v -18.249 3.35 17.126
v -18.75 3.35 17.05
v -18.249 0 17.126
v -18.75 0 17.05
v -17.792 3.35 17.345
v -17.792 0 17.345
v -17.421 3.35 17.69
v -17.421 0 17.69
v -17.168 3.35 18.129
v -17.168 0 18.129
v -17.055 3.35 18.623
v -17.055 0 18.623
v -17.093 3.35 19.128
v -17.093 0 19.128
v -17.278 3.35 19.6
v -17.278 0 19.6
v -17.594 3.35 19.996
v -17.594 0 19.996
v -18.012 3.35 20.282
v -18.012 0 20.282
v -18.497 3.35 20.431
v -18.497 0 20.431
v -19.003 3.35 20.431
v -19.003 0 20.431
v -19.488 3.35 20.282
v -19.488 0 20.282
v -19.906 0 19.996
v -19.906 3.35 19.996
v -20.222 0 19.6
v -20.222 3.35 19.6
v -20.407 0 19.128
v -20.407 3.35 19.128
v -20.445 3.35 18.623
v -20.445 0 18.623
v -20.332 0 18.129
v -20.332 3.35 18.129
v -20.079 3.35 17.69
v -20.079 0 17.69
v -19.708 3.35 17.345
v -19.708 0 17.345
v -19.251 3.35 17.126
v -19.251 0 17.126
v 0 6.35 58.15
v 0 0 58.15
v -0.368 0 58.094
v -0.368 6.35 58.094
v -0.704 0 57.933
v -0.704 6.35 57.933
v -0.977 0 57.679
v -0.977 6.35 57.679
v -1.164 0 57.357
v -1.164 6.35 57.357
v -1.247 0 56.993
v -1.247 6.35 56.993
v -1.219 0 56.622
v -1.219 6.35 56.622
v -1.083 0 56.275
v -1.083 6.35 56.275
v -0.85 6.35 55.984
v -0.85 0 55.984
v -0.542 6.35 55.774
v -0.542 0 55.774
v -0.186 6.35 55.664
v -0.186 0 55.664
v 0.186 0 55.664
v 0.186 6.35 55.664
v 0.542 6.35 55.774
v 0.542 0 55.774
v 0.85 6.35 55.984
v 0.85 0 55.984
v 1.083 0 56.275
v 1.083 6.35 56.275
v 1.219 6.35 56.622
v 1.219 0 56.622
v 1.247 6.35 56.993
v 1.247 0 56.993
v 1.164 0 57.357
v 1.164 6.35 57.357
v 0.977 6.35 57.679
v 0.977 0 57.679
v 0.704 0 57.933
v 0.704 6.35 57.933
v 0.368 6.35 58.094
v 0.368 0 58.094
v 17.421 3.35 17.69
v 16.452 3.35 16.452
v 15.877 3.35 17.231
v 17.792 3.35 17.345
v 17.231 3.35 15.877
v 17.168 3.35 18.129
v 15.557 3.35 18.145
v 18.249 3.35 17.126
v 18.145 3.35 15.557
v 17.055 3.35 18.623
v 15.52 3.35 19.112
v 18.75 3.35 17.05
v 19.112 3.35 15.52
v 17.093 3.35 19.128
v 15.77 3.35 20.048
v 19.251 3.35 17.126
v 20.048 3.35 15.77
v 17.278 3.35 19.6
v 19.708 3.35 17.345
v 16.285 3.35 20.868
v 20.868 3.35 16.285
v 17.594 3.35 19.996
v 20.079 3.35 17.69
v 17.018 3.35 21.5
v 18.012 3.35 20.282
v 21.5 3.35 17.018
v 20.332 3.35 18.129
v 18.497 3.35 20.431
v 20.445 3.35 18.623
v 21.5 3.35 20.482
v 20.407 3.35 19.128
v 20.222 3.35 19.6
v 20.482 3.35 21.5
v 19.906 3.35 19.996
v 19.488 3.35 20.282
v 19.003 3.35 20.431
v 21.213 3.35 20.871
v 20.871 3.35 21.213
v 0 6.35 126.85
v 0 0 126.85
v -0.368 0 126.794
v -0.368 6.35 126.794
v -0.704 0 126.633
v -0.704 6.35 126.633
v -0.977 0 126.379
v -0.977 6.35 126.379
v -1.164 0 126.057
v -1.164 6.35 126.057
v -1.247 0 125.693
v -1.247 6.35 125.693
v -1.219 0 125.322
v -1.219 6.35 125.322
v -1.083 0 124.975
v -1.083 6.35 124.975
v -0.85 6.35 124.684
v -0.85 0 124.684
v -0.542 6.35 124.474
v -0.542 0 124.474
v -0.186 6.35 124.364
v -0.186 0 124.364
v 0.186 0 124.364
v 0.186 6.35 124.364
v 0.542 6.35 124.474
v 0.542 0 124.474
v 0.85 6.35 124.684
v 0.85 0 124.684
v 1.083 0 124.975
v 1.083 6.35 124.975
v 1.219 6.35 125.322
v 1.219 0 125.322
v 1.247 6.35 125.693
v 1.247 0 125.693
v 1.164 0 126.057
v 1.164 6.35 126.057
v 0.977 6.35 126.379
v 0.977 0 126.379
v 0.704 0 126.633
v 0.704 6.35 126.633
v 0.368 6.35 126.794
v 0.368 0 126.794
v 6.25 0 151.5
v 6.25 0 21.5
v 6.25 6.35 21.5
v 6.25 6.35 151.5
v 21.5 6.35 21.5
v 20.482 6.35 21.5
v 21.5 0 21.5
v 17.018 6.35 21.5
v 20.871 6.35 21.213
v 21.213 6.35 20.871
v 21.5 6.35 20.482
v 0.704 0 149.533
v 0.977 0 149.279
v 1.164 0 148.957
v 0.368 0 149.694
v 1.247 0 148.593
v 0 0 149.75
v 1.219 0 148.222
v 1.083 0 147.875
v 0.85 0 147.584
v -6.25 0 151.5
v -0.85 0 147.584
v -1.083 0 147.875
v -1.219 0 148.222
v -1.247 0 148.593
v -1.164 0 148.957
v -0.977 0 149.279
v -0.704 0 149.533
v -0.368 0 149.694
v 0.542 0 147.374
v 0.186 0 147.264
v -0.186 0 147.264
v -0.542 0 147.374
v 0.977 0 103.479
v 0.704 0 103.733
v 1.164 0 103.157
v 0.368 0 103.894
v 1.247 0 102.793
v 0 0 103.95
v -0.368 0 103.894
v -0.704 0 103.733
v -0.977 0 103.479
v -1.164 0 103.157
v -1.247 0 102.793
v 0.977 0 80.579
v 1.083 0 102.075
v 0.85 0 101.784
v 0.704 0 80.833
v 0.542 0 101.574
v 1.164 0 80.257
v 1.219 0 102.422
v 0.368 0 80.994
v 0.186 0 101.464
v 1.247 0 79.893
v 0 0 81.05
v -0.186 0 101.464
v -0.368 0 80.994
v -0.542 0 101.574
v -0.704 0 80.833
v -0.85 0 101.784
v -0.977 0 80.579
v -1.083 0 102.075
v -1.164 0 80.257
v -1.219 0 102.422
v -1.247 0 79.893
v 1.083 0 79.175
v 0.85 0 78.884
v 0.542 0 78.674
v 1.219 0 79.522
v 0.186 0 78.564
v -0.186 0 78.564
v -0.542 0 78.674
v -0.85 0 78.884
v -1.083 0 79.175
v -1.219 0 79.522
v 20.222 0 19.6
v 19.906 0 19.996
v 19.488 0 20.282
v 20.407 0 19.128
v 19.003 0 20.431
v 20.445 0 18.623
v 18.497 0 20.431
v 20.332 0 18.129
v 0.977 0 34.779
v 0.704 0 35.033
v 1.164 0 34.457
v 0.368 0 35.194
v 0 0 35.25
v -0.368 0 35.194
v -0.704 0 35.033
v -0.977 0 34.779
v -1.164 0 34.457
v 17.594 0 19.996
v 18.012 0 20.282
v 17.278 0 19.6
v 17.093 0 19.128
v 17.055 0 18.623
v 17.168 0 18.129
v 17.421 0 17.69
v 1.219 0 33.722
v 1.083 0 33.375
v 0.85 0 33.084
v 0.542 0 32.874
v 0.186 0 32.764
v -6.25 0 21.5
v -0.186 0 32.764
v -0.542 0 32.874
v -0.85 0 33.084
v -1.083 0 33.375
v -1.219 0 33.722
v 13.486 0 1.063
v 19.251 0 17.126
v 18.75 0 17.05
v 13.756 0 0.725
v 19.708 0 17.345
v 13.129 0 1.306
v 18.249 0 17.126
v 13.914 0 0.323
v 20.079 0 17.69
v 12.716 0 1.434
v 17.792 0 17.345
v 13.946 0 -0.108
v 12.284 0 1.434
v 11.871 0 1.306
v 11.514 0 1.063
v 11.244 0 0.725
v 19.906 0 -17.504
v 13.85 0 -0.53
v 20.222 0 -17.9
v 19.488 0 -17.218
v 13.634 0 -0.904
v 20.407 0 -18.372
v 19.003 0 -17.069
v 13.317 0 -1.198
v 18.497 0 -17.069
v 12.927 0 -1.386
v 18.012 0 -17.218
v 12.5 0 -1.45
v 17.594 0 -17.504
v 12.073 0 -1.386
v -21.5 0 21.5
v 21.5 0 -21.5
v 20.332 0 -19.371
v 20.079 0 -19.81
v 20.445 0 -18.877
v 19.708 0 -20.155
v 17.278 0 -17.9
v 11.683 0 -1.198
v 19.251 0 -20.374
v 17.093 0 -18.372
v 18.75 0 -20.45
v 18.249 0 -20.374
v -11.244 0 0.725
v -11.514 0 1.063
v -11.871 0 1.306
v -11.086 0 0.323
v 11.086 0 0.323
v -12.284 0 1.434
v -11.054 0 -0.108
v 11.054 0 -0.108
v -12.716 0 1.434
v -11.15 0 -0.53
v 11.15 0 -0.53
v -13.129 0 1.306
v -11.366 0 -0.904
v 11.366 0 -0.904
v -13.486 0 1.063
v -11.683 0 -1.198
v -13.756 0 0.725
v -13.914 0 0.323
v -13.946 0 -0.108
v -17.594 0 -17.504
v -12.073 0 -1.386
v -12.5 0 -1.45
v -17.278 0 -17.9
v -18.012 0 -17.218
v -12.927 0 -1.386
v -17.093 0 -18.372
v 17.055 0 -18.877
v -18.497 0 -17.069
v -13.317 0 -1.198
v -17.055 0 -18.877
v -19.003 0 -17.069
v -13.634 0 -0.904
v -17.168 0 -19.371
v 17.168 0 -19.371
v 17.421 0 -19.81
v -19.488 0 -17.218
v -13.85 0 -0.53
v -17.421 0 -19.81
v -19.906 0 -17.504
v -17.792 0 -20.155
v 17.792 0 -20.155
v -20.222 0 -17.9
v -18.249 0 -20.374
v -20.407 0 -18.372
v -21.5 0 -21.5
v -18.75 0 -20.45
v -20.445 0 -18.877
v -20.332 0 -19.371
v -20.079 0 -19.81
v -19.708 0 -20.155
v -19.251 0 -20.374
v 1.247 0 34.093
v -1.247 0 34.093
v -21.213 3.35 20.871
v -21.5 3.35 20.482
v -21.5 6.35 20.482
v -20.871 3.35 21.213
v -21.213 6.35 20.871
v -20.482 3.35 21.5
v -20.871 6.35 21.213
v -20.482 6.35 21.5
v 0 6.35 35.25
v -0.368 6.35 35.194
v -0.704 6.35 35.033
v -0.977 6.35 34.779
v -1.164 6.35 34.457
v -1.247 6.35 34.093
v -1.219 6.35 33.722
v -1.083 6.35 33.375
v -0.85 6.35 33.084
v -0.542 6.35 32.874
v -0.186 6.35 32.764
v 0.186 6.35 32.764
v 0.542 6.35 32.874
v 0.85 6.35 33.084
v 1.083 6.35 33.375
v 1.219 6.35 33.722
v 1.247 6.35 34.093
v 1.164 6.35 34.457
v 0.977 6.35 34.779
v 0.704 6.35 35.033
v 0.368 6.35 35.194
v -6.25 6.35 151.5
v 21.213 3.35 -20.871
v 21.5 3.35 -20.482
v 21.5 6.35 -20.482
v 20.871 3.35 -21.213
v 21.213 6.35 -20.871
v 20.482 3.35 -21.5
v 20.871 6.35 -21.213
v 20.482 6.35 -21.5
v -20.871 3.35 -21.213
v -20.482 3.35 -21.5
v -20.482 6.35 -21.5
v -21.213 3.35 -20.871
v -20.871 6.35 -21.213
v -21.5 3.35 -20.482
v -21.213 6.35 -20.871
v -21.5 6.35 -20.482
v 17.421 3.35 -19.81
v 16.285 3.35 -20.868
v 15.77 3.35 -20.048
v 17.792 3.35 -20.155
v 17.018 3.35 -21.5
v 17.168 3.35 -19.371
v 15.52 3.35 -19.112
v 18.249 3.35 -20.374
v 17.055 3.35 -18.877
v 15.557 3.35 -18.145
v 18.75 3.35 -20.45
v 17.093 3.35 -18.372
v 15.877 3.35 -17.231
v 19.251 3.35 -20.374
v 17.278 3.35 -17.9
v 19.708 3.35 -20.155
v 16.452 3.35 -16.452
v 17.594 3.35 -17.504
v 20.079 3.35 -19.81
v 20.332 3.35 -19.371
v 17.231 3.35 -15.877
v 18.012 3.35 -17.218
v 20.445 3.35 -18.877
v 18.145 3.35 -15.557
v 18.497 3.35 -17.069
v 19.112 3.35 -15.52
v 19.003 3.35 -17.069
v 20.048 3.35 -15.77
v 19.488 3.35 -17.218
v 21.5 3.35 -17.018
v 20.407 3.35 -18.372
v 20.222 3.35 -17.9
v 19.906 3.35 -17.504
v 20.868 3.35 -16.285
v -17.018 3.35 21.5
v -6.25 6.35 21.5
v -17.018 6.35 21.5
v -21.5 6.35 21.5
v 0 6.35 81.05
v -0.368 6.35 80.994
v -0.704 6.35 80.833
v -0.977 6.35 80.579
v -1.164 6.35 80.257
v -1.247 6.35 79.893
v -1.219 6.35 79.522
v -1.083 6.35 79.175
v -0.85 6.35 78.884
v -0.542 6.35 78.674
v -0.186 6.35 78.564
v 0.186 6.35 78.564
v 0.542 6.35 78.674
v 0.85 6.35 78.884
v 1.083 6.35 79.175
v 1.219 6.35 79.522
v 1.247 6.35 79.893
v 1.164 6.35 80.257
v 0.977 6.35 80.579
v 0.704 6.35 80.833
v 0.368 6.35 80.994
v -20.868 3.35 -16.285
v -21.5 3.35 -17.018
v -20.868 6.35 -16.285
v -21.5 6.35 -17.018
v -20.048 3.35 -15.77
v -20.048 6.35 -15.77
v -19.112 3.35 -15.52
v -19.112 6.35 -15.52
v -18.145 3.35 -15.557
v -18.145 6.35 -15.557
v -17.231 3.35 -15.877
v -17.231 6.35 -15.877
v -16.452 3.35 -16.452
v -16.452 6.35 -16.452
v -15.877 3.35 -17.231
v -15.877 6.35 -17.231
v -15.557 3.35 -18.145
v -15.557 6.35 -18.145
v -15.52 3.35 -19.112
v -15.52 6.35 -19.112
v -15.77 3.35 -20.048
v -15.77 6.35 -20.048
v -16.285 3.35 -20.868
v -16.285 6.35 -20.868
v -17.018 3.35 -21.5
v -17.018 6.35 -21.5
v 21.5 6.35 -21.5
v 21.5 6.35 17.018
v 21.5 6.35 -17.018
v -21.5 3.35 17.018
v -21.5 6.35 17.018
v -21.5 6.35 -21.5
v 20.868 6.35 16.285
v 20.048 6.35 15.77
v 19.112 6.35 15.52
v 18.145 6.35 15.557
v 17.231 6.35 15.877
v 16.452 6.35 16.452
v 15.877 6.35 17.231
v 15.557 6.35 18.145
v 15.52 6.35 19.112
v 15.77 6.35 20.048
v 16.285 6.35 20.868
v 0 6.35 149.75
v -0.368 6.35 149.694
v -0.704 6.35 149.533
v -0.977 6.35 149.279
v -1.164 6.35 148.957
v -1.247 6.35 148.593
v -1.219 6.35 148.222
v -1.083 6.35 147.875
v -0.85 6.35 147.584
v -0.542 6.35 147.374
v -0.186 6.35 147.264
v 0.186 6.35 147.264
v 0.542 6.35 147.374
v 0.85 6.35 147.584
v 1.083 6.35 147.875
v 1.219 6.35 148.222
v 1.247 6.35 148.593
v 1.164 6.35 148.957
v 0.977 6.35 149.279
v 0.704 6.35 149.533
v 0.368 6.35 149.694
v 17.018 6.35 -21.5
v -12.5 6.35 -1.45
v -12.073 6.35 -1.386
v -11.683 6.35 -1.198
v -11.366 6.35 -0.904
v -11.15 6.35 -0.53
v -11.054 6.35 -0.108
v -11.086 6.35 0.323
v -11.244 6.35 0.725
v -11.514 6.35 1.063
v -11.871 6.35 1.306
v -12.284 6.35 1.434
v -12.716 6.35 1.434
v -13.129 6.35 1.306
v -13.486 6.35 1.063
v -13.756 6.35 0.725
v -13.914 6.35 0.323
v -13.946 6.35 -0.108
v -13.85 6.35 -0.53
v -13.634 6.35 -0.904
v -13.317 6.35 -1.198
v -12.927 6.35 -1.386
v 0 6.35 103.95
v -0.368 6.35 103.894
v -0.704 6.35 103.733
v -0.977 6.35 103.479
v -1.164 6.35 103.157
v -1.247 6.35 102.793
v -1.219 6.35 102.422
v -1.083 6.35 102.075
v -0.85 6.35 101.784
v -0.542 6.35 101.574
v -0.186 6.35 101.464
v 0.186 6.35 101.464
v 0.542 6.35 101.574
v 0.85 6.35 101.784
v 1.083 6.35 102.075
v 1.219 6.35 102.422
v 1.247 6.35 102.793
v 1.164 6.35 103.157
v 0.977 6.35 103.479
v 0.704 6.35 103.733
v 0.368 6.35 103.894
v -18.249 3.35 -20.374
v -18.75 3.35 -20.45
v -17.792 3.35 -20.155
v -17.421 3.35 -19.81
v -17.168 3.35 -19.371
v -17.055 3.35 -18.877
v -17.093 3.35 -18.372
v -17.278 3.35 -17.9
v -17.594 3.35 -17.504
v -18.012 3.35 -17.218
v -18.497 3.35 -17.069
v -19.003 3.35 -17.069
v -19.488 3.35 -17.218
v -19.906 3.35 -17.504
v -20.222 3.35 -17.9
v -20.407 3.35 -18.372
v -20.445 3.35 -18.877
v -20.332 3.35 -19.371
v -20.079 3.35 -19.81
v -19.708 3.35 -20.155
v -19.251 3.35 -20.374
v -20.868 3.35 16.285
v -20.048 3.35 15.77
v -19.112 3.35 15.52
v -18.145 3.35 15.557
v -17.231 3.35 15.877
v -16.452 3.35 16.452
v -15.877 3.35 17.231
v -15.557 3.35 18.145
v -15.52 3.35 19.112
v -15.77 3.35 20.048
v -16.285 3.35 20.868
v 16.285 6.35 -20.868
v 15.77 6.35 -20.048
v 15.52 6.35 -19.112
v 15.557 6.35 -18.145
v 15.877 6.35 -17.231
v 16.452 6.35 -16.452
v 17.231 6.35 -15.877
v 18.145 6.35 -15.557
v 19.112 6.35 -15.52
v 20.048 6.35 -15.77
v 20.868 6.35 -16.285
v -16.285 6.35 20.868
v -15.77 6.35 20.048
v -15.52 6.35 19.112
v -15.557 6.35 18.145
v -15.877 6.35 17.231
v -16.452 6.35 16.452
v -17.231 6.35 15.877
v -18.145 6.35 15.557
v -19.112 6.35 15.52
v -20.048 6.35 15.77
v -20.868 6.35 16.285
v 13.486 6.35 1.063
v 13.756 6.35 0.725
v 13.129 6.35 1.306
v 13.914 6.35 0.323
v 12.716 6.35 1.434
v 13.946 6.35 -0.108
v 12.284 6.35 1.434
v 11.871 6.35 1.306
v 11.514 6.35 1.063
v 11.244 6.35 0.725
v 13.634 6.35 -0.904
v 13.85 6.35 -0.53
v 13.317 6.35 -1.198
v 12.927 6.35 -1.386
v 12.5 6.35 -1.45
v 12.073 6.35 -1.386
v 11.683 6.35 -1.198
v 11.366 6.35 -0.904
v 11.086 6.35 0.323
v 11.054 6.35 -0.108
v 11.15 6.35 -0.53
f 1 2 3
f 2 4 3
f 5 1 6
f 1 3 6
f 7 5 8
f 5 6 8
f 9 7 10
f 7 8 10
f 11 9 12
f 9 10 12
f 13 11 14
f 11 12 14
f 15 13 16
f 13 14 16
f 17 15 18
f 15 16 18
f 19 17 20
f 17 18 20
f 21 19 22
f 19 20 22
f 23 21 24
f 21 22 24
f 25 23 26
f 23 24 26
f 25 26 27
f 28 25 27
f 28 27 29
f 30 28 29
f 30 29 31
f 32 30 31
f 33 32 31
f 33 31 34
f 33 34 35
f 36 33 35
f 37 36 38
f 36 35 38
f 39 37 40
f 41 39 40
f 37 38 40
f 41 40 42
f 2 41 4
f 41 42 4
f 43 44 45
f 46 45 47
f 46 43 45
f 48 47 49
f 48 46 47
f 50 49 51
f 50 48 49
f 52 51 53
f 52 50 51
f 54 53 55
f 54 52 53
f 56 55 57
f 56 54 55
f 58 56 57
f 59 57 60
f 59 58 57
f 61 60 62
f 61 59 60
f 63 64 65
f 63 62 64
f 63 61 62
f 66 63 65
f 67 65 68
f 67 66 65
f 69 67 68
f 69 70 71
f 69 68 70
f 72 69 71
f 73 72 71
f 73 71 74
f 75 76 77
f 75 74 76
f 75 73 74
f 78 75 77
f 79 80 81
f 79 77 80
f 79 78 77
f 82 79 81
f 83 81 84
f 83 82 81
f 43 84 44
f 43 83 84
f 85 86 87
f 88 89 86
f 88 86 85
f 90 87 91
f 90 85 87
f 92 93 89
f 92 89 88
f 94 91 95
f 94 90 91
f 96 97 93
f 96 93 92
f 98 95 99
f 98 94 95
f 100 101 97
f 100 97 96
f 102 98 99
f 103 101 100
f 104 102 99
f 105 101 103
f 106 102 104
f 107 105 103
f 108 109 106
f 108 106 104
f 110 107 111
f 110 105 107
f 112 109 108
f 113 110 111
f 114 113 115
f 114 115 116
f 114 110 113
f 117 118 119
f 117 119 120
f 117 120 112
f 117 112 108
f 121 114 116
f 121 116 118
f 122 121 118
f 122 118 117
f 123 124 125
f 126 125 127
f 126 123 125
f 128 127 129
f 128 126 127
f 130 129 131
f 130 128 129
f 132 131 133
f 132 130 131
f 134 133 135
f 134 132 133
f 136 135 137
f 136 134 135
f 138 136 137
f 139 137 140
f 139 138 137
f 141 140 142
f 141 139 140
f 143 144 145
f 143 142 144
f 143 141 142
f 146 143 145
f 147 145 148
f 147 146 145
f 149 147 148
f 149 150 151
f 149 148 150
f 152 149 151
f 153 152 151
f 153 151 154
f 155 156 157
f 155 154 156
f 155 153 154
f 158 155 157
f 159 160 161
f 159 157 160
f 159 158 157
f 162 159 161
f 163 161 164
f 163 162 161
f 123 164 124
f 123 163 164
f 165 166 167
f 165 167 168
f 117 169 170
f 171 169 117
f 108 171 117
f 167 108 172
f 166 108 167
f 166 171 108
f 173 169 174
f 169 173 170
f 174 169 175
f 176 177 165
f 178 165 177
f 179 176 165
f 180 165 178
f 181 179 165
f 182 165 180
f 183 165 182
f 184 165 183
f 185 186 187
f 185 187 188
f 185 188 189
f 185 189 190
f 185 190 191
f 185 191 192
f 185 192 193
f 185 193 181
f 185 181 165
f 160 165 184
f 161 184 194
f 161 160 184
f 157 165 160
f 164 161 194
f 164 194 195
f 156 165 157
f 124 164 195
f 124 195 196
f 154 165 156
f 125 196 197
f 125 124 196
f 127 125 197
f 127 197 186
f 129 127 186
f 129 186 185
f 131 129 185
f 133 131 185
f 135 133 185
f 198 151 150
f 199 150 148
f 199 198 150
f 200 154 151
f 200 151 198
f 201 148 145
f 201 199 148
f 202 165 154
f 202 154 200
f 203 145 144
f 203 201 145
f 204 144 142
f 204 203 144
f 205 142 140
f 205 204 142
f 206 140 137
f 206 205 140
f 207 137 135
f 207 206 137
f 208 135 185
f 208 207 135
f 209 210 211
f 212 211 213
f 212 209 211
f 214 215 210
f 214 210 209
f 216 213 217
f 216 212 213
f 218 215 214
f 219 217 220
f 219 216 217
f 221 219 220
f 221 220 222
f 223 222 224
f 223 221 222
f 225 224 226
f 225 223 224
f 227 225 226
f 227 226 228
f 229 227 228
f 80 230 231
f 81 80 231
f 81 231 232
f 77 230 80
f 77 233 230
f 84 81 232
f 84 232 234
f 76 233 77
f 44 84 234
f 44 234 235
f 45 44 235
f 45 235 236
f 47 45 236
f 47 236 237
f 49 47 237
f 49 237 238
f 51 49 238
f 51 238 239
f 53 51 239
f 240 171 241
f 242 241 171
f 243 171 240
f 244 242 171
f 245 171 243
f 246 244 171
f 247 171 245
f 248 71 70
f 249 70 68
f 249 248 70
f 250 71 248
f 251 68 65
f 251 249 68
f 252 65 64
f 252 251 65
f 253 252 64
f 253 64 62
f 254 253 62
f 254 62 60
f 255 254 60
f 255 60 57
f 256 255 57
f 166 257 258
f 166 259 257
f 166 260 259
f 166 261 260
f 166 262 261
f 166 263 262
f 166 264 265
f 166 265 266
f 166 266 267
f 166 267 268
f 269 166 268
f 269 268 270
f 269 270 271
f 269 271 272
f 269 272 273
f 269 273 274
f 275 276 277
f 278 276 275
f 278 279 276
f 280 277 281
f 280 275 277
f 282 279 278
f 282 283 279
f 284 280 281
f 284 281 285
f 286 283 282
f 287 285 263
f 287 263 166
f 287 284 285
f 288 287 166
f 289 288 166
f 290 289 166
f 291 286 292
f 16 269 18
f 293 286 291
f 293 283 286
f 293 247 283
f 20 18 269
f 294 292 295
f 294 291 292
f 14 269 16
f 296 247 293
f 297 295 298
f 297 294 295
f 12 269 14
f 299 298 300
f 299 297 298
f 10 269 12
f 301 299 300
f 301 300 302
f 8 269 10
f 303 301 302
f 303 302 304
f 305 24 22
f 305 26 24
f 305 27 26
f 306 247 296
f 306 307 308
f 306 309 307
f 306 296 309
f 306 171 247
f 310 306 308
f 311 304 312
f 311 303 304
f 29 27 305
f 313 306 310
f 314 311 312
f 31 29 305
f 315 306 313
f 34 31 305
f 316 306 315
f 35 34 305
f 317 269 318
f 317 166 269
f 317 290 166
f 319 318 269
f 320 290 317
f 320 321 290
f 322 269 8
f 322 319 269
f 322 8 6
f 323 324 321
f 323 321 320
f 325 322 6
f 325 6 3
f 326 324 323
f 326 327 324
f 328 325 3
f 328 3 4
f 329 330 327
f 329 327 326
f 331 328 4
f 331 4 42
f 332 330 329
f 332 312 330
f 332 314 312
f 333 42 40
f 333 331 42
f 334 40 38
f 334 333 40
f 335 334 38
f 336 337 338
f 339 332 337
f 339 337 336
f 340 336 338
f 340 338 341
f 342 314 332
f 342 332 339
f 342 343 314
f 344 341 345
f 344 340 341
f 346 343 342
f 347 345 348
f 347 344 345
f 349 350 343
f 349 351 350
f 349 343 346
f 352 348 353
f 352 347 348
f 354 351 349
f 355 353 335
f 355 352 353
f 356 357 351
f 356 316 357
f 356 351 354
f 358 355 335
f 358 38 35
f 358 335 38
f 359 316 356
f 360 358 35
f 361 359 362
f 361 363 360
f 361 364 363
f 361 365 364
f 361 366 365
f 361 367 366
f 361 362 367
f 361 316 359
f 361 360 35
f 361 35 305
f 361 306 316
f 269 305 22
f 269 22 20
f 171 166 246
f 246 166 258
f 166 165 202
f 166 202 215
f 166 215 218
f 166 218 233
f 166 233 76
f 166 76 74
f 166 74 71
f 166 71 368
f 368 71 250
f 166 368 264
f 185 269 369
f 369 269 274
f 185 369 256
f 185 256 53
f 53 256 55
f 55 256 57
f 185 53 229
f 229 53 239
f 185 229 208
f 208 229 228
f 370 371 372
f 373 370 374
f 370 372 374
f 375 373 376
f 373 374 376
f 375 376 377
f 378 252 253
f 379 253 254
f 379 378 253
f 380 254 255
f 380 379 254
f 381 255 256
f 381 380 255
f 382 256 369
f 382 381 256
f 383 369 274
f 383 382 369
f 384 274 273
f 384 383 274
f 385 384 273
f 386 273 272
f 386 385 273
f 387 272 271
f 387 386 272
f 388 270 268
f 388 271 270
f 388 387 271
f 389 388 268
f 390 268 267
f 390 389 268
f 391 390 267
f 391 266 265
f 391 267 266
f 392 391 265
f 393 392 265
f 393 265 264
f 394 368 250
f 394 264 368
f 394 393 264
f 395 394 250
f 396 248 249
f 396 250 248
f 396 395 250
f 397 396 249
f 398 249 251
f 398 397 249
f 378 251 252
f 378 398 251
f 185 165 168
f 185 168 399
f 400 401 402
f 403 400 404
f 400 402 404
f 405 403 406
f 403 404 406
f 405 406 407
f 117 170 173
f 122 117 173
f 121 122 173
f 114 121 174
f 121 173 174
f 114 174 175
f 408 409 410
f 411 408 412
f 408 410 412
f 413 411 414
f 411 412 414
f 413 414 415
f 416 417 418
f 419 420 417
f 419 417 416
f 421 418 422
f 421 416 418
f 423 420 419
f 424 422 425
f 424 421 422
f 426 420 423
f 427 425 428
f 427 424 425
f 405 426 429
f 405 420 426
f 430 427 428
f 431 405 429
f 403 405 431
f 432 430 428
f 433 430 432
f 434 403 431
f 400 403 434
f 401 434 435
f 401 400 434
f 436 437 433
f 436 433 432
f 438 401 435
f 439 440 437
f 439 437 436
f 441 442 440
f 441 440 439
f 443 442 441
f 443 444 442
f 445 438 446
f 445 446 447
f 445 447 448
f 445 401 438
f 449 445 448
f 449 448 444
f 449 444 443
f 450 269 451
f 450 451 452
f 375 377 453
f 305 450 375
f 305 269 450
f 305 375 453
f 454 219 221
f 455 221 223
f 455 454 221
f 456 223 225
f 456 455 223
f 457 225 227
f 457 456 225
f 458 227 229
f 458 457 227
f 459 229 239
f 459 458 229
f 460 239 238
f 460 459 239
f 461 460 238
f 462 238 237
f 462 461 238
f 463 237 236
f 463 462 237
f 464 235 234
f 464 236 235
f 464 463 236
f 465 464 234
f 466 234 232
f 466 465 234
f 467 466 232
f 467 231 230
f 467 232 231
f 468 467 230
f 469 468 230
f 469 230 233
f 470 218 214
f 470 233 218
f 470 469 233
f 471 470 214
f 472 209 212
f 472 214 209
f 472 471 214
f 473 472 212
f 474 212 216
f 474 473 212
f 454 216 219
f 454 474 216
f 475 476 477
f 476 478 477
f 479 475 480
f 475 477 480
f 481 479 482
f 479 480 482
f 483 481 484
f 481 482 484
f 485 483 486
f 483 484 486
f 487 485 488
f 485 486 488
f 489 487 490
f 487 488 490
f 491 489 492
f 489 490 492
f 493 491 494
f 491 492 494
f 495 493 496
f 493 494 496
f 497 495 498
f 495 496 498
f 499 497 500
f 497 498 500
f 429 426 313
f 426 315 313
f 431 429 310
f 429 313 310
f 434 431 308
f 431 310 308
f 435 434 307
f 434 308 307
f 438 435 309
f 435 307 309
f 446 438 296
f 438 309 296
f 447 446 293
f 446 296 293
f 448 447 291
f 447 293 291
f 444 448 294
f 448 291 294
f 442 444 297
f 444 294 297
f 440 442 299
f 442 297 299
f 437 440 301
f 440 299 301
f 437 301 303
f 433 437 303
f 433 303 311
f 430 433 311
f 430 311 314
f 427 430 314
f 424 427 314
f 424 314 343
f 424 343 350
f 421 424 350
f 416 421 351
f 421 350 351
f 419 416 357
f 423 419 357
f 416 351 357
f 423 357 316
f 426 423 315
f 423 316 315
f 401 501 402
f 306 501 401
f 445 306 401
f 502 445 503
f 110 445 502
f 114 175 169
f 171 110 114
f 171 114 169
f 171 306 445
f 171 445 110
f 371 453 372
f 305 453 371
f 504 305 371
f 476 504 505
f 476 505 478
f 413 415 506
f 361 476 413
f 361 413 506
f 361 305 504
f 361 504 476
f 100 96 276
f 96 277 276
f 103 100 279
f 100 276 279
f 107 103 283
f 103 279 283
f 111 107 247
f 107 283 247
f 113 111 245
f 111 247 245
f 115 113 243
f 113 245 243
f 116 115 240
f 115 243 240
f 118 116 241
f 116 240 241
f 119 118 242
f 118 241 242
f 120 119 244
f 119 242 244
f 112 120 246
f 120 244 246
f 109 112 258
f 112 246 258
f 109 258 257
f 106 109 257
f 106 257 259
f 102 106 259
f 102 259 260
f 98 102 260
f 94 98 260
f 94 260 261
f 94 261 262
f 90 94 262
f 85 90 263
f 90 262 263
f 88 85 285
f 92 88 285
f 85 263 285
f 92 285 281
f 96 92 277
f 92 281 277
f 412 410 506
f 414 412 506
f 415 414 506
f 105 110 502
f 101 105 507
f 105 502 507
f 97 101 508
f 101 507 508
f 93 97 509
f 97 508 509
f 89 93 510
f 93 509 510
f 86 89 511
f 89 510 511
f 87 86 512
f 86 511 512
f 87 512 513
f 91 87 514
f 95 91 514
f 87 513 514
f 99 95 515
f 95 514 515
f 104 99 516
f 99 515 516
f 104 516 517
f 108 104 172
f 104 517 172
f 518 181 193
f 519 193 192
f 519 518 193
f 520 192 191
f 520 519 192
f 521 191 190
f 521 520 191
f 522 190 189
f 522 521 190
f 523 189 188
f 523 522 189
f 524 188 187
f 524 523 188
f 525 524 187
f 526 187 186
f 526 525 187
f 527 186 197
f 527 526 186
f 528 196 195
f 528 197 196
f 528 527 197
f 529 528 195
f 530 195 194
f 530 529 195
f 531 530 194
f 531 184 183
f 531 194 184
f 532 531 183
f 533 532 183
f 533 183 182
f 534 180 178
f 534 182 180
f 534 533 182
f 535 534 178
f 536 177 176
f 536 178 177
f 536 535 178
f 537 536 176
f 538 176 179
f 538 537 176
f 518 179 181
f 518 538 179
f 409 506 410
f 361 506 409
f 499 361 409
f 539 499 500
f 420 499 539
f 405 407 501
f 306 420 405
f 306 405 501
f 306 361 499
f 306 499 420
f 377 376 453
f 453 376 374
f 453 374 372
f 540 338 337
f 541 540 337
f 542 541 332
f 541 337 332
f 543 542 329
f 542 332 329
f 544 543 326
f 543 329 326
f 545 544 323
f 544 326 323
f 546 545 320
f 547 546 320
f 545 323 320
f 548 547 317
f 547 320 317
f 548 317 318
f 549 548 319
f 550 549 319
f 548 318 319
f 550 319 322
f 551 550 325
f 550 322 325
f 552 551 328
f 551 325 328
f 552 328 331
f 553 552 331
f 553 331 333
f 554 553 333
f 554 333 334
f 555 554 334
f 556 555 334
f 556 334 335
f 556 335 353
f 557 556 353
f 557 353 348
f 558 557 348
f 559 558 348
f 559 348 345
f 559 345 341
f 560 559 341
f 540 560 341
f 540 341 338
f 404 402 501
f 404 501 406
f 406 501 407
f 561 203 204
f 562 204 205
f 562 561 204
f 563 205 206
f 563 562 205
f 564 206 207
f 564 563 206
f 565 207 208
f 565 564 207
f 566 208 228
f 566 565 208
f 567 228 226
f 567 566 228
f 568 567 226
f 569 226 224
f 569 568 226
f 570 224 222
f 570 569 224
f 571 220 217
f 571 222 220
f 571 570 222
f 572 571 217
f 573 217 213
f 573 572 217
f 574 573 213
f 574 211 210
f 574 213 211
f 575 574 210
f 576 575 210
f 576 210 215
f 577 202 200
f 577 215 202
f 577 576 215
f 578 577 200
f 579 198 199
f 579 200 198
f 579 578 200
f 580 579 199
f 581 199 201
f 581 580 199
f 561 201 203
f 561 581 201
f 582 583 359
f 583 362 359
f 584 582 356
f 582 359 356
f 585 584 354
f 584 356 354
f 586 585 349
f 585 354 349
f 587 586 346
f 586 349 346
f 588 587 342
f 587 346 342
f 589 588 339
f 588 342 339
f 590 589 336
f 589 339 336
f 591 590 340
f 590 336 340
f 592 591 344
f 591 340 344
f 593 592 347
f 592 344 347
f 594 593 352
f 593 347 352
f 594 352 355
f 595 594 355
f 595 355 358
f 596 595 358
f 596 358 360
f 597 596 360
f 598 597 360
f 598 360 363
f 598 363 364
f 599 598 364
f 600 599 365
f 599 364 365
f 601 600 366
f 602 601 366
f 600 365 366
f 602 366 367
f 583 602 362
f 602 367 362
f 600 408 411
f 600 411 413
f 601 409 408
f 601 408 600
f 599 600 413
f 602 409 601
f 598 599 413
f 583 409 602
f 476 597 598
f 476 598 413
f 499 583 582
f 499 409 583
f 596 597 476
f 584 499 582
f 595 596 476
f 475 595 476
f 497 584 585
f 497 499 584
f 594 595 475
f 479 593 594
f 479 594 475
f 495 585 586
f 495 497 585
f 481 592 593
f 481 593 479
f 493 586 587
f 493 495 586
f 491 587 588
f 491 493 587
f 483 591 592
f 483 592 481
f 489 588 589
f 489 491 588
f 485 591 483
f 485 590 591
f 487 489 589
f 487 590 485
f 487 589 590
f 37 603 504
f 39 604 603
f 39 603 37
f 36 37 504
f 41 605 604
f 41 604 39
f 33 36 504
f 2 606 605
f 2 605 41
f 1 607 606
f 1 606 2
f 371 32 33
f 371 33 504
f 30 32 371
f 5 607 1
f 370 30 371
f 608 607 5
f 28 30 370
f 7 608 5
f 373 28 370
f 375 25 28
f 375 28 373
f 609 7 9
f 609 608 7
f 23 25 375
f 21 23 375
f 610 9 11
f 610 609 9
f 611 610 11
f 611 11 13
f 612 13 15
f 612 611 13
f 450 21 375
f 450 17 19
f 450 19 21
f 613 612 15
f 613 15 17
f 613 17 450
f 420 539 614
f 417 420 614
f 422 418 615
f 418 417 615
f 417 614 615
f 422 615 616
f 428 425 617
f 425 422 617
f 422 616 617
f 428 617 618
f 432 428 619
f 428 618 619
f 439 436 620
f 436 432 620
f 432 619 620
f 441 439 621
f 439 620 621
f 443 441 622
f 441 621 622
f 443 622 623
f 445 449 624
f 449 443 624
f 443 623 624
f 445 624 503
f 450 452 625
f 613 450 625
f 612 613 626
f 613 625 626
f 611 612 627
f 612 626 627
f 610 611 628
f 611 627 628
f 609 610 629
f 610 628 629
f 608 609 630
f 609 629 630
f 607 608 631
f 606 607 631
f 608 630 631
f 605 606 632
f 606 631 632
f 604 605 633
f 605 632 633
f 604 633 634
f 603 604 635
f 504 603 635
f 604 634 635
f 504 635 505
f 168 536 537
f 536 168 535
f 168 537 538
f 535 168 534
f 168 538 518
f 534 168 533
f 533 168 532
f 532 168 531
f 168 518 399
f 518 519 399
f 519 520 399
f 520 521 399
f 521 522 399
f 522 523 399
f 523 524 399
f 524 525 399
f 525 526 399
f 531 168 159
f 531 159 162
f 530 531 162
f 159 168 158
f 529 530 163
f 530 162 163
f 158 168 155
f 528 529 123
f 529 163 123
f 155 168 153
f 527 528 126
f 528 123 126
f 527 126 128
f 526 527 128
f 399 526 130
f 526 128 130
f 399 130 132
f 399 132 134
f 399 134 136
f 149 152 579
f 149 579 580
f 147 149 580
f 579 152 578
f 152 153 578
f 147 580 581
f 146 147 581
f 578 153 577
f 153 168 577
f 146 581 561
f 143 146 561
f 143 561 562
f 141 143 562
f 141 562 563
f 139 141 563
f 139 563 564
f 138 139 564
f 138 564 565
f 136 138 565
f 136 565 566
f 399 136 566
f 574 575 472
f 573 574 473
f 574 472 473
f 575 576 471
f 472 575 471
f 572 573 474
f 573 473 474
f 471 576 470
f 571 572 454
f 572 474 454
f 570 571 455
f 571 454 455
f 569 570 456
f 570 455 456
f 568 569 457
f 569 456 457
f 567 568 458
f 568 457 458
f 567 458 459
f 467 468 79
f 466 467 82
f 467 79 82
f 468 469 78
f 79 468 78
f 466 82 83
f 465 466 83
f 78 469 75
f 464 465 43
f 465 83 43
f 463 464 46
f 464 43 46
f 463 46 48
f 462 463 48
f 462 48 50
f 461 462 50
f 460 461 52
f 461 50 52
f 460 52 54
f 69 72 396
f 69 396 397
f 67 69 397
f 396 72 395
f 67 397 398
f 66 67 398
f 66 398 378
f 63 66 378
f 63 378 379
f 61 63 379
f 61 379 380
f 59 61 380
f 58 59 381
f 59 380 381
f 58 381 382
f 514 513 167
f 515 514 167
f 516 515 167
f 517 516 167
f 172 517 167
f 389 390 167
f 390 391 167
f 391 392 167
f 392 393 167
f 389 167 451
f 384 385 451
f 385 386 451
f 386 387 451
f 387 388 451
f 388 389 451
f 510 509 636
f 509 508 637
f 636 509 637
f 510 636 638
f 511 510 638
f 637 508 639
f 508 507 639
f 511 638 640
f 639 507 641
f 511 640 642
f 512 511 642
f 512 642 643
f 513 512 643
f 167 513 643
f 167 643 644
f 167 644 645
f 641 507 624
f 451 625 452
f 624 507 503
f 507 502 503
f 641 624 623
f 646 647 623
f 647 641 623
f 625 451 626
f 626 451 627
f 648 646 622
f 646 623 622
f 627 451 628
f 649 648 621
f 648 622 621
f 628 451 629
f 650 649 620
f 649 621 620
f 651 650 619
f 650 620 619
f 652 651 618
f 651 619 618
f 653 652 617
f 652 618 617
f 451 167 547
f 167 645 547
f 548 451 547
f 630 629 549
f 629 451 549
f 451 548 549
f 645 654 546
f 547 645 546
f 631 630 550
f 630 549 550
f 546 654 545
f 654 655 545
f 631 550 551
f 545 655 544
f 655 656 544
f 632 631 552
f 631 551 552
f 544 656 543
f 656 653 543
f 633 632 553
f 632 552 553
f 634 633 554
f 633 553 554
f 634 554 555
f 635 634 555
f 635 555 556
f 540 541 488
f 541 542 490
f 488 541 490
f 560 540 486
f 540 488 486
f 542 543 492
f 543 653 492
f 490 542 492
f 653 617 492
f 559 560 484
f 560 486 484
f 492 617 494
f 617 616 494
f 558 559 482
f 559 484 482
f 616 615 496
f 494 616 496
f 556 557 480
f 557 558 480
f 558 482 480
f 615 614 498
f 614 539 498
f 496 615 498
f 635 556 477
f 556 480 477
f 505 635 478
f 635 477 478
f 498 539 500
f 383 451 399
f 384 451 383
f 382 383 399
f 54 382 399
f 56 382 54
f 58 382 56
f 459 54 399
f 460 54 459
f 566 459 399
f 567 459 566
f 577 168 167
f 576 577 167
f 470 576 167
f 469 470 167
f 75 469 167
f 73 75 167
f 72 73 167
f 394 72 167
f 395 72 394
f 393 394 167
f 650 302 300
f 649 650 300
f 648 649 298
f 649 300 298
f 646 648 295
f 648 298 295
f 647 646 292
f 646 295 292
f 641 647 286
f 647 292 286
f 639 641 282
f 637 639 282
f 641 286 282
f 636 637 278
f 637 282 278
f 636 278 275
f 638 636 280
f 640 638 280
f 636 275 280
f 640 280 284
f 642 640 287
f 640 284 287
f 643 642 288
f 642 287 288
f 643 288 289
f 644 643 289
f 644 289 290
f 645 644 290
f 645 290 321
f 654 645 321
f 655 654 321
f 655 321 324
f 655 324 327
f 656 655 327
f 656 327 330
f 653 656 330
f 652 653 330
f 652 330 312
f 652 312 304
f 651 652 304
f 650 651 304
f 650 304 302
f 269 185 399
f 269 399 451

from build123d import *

# Parameters (mm, degrees)
EXTRUDE1_DEPTH                 = 6.35
LPATTERN1_COUNT                = 6
LPATTERN1_PITCH                = 22.9
CBORE_FOR_M3_SHCS1_D           = 3.4
CBORE_FOR_M3_SHCS1_CBORE_D     = 6.5
CBORE_FOR_M3_SHCS1_CBORE_DEPTH = 3
LPATTERN2_COUNT                = 2
LPATTERN2_PITCH                = 37.5
LPATTERN2_COUNT_DIR2           = 2
LPATTERN2_PITCH_DIR2           = 37.5
F_2_9_2_9_DIAMETER_HOLE1_D     = 2.9


with BuildPart() as part:
    # Sketch2 → Extrude1 (new body)
    with BuildSketch(Plane(origin=(0, 0, 0), x_dir=(1, 0, 0), z_dir=(0, 1, 0))):
        Polygon((-6.25, -21.5), (-21.5, -21.5), (-21.5, 21.5), (21.5, 21.5), (21.5, -21.5), (6.25, -21.5), (6.25, -151.5), (-6.25, -151.5), align=None)
    extrude(amount=EXTRUDE1_DEPTH)

    # Sketch5 → M3x0.5 Tapped Hole1 (revolve, cut)
    with BuildSketch(Plane(origin=(0, 6.35, 148.5), x_dir=(0, 0, 1), z_dir=(1, 0, 0))):
        Polygon((0, 0), (0, 8.251075774), (1.25, 7.5), (1.25, 0), align=None)
    m3x0_5_tapped_hole1 = revolve(axis=Axis((0, 12.7, 148.5), (0, -1, 0)), mode=Mode.SUBTRACT)

    # LPattern1: M3x0.5 Tapped Hole1 ×6
    with Locations(*[(0, 0, -i * LPATTERN1_PITCH) for i in range(1, LPATTERN1_COUNT)]):
        add(m3x0_5_tapped_hole1, mode=Mode.SUBTRACT)

    # CBORE for M3 SHCS1 (through all)
    with Locations(Plane(origin=(-18.75, 6.35, -18.75), x_dir=(0, 0, 1), z_dir=(0, 1, 0))):
        with Locations((0, 0)):
            cbore_for_m3_shcs1 = CounterBoreHole(CBORE_FOR_M3_SHCS1_D / 2, CBORE_FOR_M3_SHCS1_CBORE_D / 2, CBORE_FOR_M3_SHCS1_CBORE_DEPTH)

    # LPattern2: CBORE for M3 SHCS1 2 × 2
    with Locations(*[(i * LPATTERN2_PITCH, 0, j * LPATTERN2_PITCH_DIR2) for i in range(LPATTERN2_COUNT) for j in range(LPATTERN2_COUNT_DIR2) if (i, j) != (0, 0)]):
        add(cbore_for_m3_shcs1, mode=Mode.SUBTRACT)

    # Ø2.9 (2.9) Diameter Hole1 (through all)
    with Locations(Plane(origin=(-12.5, 6.35, 0), x_dir=(0, 0, 1), z_dir=(0, 1, 0))):
        with Locations((0, 0), (0, 25)):
            Hole(F_2_9_2_9_DIAMETER_HOLE1_D / 2)


solid = part.part
